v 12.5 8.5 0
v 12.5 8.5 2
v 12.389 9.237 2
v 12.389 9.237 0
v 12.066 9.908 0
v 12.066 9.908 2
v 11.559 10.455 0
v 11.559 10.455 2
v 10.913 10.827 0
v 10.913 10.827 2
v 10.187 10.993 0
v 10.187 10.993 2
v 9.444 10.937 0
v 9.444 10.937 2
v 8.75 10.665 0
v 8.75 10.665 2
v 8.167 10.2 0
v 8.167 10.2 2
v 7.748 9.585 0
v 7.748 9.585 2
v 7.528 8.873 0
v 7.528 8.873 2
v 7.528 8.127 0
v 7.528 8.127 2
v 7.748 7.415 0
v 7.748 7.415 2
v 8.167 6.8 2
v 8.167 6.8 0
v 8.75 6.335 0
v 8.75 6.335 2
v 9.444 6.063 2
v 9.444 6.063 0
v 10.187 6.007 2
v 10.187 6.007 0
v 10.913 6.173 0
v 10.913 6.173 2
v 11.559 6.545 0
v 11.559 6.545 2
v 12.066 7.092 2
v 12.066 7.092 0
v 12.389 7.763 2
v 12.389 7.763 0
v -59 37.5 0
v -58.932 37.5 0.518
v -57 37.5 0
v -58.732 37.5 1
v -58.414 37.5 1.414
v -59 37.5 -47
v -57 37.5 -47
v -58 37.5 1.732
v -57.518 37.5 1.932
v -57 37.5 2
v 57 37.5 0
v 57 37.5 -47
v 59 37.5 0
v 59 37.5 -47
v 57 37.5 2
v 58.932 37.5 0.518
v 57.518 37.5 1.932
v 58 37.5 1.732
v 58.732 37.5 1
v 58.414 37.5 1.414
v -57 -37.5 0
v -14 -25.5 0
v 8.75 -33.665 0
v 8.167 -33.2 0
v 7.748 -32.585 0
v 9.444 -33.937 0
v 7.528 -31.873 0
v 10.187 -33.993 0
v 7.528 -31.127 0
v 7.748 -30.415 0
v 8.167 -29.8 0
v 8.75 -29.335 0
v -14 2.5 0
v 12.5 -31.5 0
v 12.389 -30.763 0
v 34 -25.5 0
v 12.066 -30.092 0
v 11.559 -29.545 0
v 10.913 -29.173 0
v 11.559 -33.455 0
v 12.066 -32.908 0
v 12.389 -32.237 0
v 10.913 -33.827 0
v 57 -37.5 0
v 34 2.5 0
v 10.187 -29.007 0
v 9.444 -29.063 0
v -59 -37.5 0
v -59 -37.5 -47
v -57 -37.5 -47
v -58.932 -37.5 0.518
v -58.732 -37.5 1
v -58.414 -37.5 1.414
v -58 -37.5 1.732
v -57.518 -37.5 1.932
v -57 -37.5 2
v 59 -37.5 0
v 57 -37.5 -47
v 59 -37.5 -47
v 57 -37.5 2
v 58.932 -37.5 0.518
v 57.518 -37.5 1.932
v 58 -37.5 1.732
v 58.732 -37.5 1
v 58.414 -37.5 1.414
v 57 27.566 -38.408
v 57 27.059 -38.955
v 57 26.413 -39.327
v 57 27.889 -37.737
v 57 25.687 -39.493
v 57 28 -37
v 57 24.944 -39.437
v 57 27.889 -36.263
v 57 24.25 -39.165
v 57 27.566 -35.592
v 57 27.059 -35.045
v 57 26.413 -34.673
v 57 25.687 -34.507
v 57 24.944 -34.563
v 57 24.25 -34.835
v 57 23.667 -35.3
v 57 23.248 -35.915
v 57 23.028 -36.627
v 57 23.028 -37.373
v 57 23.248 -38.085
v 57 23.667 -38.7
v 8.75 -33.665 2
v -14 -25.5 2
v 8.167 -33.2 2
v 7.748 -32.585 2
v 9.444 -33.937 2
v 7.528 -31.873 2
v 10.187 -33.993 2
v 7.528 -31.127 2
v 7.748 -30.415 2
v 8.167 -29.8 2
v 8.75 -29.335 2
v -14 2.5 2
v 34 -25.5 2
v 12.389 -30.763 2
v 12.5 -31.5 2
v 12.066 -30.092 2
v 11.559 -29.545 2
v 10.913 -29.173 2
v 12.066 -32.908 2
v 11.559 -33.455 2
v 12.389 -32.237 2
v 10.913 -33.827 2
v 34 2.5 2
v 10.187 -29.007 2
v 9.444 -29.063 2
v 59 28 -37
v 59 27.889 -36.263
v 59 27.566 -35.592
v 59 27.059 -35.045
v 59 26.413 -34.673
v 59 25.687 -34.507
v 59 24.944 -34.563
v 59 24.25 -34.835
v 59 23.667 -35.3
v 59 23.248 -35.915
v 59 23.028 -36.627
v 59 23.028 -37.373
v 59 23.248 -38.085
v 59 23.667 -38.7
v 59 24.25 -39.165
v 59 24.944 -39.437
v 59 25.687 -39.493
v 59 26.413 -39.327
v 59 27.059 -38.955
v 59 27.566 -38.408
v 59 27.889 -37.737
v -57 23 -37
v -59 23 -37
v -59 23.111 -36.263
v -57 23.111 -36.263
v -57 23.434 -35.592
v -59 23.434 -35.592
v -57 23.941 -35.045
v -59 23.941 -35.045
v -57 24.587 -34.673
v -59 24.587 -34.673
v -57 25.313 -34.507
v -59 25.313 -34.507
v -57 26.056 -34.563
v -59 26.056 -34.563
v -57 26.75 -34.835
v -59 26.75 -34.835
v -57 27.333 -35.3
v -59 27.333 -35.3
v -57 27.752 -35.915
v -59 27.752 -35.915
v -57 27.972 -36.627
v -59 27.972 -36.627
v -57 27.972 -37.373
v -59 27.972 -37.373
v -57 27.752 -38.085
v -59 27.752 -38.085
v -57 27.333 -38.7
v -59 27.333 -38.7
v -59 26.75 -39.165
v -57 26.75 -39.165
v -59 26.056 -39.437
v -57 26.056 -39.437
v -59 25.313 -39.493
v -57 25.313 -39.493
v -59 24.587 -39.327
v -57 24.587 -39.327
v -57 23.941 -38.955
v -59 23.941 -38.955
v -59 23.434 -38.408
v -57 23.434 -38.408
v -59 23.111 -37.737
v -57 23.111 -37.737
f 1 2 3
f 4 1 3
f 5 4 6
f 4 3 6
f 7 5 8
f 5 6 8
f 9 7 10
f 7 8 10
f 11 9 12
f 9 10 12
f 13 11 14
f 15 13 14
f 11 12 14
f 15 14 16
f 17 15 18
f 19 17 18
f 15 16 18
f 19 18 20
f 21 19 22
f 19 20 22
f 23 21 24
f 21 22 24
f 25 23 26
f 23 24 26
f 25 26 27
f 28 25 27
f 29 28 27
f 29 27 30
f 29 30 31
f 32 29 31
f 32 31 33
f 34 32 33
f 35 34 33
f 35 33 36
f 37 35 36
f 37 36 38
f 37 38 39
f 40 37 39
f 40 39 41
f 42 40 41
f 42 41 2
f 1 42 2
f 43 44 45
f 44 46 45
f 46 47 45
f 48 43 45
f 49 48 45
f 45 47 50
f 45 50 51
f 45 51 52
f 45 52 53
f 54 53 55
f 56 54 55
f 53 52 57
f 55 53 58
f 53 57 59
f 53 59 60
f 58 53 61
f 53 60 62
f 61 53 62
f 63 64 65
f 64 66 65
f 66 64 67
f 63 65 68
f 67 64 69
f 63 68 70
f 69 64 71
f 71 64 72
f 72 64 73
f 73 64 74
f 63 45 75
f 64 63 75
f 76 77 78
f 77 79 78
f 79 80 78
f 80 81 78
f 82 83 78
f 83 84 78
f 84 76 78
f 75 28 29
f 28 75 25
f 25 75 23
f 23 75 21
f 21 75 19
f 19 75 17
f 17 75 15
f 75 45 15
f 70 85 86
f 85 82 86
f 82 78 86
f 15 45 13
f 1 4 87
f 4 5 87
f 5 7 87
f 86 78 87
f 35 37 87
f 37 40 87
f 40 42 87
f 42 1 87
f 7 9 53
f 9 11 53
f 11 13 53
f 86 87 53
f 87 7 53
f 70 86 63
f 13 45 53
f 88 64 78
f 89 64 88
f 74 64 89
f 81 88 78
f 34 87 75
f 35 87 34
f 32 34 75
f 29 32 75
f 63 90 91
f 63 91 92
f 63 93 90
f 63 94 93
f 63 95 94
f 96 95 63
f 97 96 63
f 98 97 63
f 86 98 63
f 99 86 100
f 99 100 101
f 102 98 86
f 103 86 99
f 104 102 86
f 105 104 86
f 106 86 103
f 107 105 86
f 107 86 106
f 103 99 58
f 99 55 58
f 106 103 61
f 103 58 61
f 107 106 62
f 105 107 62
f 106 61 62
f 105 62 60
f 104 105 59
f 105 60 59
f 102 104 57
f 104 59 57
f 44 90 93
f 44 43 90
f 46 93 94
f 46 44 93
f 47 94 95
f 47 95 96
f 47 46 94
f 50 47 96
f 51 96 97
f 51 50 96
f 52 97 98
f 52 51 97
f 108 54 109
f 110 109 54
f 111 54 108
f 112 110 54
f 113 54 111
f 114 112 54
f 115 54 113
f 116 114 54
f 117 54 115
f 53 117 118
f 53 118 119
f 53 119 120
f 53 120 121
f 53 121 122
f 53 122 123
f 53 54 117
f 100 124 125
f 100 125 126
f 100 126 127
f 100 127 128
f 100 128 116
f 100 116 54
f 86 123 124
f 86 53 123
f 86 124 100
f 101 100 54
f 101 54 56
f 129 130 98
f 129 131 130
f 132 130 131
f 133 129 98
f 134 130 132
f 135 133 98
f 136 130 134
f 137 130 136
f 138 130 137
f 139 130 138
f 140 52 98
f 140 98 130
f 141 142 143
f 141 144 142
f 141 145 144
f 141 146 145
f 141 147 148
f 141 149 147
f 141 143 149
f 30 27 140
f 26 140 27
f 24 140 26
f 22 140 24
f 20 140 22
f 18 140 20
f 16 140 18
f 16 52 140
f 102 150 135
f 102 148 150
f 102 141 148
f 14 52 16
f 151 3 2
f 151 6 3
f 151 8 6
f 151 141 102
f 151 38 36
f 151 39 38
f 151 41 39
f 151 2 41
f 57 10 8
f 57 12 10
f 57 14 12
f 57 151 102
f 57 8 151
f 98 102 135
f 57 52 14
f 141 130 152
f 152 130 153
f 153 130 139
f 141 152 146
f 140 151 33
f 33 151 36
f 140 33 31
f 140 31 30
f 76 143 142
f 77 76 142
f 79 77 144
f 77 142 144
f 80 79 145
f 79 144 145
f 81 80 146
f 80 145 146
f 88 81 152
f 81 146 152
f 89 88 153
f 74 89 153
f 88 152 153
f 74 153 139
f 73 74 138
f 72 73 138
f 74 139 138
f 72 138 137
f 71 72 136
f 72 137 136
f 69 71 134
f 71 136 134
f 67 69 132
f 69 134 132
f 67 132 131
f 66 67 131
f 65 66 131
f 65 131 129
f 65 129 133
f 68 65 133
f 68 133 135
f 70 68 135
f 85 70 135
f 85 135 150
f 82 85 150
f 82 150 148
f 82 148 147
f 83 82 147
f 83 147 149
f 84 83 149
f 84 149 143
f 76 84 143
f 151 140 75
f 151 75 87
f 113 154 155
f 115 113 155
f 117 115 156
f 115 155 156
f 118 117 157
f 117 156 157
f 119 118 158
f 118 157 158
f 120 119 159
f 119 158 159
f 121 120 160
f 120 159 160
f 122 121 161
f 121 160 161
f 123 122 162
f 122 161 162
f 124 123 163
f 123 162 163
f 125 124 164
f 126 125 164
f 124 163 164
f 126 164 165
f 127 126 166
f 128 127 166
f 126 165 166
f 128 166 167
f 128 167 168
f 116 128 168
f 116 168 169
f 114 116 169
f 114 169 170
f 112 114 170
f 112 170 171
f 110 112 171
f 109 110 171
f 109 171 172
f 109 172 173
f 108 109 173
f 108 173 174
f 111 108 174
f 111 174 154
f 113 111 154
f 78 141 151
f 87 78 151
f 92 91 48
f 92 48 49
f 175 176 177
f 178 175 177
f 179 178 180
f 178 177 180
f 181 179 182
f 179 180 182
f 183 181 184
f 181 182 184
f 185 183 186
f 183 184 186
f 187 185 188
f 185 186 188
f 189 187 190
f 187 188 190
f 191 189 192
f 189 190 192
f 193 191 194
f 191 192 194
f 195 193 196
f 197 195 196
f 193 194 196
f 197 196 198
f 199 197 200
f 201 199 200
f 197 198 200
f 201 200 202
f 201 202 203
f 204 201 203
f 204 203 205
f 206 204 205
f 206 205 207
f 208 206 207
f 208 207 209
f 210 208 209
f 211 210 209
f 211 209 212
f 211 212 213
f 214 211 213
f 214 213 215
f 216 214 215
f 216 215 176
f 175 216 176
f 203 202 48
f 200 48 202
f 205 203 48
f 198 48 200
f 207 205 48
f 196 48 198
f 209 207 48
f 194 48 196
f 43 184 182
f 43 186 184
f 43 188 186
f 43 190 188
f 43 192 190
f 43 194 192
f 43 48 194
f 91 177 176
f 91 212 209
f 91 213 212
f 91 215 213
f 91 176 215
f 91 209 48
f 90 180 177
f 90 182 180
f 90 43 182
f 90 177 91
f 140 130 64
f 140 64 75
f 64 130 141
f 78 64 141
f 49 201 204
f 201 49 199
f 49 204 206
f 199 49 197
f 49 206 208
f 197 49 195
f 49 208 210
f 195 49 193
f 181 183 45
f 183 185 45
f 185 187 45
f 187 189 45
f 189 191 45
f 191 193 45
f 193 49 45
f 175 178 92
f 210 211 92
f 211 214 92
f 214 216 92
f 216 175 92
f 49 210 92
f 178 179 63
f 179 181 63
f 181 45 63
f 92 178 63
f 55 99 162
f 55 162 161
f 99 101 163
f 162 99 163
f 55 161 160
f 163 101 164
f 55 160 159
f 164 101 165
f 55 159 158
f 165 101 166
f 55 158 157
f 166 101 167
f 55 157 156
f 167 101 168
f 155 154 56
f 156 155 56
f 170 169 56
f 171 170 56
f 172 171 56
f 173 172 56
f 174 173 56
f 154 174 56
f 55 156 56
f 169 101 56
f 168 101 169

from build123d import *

# Parameters (mm, degrees)
F0_W      = 118
F0_H      = 75
F1_DEPTH  = 2
F2_W      = 48
F2_H      = 28
F2_R      = 2.5
F3_DEPTH  = 25
F4_W      = 2
F4_H      = 75
F5_DEPTH  = 47
F6_R      = 2
F7_R      = 2.5
F8_DEPTH  = 25
F9_R      = 2.5
F10_DEPTH = 25


with BuildPart() as f1:
    # F0 (on Top) → F1 (new body)
    with BuildSketch(Plane.XY):
        Rectangle(F0_W, F0_H)
    extrude(amount=F1_DEPTH)

    # F2 (on face) → F3 (cut)
    with BuildSketch(Plane.XY.offset(2)):
        with Locations((10, -11.5)):
            Rectangle(F2_W, F2_H)
        with Locations((10, -31.5)):
            Circle(F2_R)
        with Locations((10, 8.5)):
            Circle(F2_R)
    extrude(amount=-F3_DEPTH, mode=Mode.SUBTRACT)

    # F4 (on face) → F5 (join)
    with BuildSketch(Plane(origin=(0, 0, 0), x_dir=(1, 0, 0), z_dir=(0, 0, -1))):
        with Locations((-58, 0)):
            Rectangle(F4_W, F4_H)
        with Locations((58, 0)):
            Rectangle(F4_W, F4_H)
    extrude(amount=F5_DEPTH)

    # F6
    f6_edges = [f1.edges().sort_by_distance(p)[0] for p in [
        (59, 0, 2),
        (-59, 0, 2),
    ]]
    fillet(f6_edges, radius=F6_R)

    # F7 (on face) → F8 (cut)
    with BuildSketch(Plane(origin=(-59, 0, 0), x_dir=(0, -1, 0), z_dir=(-1, 0, 0))):
        with Locations((-25.5, -37)):
            Circle(F7_R)
    extrude(amount=-F8_DEPTH, mode=Mode.SUBTRACT)

    # F9 (on face) → F10 (cut)
    with BuildSketch(Plane.YZ.offset(59)):
        with Locations((25.5, -37)):
            Circle(F9_R)
    extrude(amount=-F10_DEPTH, mode=Mode.SUBTRACT)


solid = f1.part
